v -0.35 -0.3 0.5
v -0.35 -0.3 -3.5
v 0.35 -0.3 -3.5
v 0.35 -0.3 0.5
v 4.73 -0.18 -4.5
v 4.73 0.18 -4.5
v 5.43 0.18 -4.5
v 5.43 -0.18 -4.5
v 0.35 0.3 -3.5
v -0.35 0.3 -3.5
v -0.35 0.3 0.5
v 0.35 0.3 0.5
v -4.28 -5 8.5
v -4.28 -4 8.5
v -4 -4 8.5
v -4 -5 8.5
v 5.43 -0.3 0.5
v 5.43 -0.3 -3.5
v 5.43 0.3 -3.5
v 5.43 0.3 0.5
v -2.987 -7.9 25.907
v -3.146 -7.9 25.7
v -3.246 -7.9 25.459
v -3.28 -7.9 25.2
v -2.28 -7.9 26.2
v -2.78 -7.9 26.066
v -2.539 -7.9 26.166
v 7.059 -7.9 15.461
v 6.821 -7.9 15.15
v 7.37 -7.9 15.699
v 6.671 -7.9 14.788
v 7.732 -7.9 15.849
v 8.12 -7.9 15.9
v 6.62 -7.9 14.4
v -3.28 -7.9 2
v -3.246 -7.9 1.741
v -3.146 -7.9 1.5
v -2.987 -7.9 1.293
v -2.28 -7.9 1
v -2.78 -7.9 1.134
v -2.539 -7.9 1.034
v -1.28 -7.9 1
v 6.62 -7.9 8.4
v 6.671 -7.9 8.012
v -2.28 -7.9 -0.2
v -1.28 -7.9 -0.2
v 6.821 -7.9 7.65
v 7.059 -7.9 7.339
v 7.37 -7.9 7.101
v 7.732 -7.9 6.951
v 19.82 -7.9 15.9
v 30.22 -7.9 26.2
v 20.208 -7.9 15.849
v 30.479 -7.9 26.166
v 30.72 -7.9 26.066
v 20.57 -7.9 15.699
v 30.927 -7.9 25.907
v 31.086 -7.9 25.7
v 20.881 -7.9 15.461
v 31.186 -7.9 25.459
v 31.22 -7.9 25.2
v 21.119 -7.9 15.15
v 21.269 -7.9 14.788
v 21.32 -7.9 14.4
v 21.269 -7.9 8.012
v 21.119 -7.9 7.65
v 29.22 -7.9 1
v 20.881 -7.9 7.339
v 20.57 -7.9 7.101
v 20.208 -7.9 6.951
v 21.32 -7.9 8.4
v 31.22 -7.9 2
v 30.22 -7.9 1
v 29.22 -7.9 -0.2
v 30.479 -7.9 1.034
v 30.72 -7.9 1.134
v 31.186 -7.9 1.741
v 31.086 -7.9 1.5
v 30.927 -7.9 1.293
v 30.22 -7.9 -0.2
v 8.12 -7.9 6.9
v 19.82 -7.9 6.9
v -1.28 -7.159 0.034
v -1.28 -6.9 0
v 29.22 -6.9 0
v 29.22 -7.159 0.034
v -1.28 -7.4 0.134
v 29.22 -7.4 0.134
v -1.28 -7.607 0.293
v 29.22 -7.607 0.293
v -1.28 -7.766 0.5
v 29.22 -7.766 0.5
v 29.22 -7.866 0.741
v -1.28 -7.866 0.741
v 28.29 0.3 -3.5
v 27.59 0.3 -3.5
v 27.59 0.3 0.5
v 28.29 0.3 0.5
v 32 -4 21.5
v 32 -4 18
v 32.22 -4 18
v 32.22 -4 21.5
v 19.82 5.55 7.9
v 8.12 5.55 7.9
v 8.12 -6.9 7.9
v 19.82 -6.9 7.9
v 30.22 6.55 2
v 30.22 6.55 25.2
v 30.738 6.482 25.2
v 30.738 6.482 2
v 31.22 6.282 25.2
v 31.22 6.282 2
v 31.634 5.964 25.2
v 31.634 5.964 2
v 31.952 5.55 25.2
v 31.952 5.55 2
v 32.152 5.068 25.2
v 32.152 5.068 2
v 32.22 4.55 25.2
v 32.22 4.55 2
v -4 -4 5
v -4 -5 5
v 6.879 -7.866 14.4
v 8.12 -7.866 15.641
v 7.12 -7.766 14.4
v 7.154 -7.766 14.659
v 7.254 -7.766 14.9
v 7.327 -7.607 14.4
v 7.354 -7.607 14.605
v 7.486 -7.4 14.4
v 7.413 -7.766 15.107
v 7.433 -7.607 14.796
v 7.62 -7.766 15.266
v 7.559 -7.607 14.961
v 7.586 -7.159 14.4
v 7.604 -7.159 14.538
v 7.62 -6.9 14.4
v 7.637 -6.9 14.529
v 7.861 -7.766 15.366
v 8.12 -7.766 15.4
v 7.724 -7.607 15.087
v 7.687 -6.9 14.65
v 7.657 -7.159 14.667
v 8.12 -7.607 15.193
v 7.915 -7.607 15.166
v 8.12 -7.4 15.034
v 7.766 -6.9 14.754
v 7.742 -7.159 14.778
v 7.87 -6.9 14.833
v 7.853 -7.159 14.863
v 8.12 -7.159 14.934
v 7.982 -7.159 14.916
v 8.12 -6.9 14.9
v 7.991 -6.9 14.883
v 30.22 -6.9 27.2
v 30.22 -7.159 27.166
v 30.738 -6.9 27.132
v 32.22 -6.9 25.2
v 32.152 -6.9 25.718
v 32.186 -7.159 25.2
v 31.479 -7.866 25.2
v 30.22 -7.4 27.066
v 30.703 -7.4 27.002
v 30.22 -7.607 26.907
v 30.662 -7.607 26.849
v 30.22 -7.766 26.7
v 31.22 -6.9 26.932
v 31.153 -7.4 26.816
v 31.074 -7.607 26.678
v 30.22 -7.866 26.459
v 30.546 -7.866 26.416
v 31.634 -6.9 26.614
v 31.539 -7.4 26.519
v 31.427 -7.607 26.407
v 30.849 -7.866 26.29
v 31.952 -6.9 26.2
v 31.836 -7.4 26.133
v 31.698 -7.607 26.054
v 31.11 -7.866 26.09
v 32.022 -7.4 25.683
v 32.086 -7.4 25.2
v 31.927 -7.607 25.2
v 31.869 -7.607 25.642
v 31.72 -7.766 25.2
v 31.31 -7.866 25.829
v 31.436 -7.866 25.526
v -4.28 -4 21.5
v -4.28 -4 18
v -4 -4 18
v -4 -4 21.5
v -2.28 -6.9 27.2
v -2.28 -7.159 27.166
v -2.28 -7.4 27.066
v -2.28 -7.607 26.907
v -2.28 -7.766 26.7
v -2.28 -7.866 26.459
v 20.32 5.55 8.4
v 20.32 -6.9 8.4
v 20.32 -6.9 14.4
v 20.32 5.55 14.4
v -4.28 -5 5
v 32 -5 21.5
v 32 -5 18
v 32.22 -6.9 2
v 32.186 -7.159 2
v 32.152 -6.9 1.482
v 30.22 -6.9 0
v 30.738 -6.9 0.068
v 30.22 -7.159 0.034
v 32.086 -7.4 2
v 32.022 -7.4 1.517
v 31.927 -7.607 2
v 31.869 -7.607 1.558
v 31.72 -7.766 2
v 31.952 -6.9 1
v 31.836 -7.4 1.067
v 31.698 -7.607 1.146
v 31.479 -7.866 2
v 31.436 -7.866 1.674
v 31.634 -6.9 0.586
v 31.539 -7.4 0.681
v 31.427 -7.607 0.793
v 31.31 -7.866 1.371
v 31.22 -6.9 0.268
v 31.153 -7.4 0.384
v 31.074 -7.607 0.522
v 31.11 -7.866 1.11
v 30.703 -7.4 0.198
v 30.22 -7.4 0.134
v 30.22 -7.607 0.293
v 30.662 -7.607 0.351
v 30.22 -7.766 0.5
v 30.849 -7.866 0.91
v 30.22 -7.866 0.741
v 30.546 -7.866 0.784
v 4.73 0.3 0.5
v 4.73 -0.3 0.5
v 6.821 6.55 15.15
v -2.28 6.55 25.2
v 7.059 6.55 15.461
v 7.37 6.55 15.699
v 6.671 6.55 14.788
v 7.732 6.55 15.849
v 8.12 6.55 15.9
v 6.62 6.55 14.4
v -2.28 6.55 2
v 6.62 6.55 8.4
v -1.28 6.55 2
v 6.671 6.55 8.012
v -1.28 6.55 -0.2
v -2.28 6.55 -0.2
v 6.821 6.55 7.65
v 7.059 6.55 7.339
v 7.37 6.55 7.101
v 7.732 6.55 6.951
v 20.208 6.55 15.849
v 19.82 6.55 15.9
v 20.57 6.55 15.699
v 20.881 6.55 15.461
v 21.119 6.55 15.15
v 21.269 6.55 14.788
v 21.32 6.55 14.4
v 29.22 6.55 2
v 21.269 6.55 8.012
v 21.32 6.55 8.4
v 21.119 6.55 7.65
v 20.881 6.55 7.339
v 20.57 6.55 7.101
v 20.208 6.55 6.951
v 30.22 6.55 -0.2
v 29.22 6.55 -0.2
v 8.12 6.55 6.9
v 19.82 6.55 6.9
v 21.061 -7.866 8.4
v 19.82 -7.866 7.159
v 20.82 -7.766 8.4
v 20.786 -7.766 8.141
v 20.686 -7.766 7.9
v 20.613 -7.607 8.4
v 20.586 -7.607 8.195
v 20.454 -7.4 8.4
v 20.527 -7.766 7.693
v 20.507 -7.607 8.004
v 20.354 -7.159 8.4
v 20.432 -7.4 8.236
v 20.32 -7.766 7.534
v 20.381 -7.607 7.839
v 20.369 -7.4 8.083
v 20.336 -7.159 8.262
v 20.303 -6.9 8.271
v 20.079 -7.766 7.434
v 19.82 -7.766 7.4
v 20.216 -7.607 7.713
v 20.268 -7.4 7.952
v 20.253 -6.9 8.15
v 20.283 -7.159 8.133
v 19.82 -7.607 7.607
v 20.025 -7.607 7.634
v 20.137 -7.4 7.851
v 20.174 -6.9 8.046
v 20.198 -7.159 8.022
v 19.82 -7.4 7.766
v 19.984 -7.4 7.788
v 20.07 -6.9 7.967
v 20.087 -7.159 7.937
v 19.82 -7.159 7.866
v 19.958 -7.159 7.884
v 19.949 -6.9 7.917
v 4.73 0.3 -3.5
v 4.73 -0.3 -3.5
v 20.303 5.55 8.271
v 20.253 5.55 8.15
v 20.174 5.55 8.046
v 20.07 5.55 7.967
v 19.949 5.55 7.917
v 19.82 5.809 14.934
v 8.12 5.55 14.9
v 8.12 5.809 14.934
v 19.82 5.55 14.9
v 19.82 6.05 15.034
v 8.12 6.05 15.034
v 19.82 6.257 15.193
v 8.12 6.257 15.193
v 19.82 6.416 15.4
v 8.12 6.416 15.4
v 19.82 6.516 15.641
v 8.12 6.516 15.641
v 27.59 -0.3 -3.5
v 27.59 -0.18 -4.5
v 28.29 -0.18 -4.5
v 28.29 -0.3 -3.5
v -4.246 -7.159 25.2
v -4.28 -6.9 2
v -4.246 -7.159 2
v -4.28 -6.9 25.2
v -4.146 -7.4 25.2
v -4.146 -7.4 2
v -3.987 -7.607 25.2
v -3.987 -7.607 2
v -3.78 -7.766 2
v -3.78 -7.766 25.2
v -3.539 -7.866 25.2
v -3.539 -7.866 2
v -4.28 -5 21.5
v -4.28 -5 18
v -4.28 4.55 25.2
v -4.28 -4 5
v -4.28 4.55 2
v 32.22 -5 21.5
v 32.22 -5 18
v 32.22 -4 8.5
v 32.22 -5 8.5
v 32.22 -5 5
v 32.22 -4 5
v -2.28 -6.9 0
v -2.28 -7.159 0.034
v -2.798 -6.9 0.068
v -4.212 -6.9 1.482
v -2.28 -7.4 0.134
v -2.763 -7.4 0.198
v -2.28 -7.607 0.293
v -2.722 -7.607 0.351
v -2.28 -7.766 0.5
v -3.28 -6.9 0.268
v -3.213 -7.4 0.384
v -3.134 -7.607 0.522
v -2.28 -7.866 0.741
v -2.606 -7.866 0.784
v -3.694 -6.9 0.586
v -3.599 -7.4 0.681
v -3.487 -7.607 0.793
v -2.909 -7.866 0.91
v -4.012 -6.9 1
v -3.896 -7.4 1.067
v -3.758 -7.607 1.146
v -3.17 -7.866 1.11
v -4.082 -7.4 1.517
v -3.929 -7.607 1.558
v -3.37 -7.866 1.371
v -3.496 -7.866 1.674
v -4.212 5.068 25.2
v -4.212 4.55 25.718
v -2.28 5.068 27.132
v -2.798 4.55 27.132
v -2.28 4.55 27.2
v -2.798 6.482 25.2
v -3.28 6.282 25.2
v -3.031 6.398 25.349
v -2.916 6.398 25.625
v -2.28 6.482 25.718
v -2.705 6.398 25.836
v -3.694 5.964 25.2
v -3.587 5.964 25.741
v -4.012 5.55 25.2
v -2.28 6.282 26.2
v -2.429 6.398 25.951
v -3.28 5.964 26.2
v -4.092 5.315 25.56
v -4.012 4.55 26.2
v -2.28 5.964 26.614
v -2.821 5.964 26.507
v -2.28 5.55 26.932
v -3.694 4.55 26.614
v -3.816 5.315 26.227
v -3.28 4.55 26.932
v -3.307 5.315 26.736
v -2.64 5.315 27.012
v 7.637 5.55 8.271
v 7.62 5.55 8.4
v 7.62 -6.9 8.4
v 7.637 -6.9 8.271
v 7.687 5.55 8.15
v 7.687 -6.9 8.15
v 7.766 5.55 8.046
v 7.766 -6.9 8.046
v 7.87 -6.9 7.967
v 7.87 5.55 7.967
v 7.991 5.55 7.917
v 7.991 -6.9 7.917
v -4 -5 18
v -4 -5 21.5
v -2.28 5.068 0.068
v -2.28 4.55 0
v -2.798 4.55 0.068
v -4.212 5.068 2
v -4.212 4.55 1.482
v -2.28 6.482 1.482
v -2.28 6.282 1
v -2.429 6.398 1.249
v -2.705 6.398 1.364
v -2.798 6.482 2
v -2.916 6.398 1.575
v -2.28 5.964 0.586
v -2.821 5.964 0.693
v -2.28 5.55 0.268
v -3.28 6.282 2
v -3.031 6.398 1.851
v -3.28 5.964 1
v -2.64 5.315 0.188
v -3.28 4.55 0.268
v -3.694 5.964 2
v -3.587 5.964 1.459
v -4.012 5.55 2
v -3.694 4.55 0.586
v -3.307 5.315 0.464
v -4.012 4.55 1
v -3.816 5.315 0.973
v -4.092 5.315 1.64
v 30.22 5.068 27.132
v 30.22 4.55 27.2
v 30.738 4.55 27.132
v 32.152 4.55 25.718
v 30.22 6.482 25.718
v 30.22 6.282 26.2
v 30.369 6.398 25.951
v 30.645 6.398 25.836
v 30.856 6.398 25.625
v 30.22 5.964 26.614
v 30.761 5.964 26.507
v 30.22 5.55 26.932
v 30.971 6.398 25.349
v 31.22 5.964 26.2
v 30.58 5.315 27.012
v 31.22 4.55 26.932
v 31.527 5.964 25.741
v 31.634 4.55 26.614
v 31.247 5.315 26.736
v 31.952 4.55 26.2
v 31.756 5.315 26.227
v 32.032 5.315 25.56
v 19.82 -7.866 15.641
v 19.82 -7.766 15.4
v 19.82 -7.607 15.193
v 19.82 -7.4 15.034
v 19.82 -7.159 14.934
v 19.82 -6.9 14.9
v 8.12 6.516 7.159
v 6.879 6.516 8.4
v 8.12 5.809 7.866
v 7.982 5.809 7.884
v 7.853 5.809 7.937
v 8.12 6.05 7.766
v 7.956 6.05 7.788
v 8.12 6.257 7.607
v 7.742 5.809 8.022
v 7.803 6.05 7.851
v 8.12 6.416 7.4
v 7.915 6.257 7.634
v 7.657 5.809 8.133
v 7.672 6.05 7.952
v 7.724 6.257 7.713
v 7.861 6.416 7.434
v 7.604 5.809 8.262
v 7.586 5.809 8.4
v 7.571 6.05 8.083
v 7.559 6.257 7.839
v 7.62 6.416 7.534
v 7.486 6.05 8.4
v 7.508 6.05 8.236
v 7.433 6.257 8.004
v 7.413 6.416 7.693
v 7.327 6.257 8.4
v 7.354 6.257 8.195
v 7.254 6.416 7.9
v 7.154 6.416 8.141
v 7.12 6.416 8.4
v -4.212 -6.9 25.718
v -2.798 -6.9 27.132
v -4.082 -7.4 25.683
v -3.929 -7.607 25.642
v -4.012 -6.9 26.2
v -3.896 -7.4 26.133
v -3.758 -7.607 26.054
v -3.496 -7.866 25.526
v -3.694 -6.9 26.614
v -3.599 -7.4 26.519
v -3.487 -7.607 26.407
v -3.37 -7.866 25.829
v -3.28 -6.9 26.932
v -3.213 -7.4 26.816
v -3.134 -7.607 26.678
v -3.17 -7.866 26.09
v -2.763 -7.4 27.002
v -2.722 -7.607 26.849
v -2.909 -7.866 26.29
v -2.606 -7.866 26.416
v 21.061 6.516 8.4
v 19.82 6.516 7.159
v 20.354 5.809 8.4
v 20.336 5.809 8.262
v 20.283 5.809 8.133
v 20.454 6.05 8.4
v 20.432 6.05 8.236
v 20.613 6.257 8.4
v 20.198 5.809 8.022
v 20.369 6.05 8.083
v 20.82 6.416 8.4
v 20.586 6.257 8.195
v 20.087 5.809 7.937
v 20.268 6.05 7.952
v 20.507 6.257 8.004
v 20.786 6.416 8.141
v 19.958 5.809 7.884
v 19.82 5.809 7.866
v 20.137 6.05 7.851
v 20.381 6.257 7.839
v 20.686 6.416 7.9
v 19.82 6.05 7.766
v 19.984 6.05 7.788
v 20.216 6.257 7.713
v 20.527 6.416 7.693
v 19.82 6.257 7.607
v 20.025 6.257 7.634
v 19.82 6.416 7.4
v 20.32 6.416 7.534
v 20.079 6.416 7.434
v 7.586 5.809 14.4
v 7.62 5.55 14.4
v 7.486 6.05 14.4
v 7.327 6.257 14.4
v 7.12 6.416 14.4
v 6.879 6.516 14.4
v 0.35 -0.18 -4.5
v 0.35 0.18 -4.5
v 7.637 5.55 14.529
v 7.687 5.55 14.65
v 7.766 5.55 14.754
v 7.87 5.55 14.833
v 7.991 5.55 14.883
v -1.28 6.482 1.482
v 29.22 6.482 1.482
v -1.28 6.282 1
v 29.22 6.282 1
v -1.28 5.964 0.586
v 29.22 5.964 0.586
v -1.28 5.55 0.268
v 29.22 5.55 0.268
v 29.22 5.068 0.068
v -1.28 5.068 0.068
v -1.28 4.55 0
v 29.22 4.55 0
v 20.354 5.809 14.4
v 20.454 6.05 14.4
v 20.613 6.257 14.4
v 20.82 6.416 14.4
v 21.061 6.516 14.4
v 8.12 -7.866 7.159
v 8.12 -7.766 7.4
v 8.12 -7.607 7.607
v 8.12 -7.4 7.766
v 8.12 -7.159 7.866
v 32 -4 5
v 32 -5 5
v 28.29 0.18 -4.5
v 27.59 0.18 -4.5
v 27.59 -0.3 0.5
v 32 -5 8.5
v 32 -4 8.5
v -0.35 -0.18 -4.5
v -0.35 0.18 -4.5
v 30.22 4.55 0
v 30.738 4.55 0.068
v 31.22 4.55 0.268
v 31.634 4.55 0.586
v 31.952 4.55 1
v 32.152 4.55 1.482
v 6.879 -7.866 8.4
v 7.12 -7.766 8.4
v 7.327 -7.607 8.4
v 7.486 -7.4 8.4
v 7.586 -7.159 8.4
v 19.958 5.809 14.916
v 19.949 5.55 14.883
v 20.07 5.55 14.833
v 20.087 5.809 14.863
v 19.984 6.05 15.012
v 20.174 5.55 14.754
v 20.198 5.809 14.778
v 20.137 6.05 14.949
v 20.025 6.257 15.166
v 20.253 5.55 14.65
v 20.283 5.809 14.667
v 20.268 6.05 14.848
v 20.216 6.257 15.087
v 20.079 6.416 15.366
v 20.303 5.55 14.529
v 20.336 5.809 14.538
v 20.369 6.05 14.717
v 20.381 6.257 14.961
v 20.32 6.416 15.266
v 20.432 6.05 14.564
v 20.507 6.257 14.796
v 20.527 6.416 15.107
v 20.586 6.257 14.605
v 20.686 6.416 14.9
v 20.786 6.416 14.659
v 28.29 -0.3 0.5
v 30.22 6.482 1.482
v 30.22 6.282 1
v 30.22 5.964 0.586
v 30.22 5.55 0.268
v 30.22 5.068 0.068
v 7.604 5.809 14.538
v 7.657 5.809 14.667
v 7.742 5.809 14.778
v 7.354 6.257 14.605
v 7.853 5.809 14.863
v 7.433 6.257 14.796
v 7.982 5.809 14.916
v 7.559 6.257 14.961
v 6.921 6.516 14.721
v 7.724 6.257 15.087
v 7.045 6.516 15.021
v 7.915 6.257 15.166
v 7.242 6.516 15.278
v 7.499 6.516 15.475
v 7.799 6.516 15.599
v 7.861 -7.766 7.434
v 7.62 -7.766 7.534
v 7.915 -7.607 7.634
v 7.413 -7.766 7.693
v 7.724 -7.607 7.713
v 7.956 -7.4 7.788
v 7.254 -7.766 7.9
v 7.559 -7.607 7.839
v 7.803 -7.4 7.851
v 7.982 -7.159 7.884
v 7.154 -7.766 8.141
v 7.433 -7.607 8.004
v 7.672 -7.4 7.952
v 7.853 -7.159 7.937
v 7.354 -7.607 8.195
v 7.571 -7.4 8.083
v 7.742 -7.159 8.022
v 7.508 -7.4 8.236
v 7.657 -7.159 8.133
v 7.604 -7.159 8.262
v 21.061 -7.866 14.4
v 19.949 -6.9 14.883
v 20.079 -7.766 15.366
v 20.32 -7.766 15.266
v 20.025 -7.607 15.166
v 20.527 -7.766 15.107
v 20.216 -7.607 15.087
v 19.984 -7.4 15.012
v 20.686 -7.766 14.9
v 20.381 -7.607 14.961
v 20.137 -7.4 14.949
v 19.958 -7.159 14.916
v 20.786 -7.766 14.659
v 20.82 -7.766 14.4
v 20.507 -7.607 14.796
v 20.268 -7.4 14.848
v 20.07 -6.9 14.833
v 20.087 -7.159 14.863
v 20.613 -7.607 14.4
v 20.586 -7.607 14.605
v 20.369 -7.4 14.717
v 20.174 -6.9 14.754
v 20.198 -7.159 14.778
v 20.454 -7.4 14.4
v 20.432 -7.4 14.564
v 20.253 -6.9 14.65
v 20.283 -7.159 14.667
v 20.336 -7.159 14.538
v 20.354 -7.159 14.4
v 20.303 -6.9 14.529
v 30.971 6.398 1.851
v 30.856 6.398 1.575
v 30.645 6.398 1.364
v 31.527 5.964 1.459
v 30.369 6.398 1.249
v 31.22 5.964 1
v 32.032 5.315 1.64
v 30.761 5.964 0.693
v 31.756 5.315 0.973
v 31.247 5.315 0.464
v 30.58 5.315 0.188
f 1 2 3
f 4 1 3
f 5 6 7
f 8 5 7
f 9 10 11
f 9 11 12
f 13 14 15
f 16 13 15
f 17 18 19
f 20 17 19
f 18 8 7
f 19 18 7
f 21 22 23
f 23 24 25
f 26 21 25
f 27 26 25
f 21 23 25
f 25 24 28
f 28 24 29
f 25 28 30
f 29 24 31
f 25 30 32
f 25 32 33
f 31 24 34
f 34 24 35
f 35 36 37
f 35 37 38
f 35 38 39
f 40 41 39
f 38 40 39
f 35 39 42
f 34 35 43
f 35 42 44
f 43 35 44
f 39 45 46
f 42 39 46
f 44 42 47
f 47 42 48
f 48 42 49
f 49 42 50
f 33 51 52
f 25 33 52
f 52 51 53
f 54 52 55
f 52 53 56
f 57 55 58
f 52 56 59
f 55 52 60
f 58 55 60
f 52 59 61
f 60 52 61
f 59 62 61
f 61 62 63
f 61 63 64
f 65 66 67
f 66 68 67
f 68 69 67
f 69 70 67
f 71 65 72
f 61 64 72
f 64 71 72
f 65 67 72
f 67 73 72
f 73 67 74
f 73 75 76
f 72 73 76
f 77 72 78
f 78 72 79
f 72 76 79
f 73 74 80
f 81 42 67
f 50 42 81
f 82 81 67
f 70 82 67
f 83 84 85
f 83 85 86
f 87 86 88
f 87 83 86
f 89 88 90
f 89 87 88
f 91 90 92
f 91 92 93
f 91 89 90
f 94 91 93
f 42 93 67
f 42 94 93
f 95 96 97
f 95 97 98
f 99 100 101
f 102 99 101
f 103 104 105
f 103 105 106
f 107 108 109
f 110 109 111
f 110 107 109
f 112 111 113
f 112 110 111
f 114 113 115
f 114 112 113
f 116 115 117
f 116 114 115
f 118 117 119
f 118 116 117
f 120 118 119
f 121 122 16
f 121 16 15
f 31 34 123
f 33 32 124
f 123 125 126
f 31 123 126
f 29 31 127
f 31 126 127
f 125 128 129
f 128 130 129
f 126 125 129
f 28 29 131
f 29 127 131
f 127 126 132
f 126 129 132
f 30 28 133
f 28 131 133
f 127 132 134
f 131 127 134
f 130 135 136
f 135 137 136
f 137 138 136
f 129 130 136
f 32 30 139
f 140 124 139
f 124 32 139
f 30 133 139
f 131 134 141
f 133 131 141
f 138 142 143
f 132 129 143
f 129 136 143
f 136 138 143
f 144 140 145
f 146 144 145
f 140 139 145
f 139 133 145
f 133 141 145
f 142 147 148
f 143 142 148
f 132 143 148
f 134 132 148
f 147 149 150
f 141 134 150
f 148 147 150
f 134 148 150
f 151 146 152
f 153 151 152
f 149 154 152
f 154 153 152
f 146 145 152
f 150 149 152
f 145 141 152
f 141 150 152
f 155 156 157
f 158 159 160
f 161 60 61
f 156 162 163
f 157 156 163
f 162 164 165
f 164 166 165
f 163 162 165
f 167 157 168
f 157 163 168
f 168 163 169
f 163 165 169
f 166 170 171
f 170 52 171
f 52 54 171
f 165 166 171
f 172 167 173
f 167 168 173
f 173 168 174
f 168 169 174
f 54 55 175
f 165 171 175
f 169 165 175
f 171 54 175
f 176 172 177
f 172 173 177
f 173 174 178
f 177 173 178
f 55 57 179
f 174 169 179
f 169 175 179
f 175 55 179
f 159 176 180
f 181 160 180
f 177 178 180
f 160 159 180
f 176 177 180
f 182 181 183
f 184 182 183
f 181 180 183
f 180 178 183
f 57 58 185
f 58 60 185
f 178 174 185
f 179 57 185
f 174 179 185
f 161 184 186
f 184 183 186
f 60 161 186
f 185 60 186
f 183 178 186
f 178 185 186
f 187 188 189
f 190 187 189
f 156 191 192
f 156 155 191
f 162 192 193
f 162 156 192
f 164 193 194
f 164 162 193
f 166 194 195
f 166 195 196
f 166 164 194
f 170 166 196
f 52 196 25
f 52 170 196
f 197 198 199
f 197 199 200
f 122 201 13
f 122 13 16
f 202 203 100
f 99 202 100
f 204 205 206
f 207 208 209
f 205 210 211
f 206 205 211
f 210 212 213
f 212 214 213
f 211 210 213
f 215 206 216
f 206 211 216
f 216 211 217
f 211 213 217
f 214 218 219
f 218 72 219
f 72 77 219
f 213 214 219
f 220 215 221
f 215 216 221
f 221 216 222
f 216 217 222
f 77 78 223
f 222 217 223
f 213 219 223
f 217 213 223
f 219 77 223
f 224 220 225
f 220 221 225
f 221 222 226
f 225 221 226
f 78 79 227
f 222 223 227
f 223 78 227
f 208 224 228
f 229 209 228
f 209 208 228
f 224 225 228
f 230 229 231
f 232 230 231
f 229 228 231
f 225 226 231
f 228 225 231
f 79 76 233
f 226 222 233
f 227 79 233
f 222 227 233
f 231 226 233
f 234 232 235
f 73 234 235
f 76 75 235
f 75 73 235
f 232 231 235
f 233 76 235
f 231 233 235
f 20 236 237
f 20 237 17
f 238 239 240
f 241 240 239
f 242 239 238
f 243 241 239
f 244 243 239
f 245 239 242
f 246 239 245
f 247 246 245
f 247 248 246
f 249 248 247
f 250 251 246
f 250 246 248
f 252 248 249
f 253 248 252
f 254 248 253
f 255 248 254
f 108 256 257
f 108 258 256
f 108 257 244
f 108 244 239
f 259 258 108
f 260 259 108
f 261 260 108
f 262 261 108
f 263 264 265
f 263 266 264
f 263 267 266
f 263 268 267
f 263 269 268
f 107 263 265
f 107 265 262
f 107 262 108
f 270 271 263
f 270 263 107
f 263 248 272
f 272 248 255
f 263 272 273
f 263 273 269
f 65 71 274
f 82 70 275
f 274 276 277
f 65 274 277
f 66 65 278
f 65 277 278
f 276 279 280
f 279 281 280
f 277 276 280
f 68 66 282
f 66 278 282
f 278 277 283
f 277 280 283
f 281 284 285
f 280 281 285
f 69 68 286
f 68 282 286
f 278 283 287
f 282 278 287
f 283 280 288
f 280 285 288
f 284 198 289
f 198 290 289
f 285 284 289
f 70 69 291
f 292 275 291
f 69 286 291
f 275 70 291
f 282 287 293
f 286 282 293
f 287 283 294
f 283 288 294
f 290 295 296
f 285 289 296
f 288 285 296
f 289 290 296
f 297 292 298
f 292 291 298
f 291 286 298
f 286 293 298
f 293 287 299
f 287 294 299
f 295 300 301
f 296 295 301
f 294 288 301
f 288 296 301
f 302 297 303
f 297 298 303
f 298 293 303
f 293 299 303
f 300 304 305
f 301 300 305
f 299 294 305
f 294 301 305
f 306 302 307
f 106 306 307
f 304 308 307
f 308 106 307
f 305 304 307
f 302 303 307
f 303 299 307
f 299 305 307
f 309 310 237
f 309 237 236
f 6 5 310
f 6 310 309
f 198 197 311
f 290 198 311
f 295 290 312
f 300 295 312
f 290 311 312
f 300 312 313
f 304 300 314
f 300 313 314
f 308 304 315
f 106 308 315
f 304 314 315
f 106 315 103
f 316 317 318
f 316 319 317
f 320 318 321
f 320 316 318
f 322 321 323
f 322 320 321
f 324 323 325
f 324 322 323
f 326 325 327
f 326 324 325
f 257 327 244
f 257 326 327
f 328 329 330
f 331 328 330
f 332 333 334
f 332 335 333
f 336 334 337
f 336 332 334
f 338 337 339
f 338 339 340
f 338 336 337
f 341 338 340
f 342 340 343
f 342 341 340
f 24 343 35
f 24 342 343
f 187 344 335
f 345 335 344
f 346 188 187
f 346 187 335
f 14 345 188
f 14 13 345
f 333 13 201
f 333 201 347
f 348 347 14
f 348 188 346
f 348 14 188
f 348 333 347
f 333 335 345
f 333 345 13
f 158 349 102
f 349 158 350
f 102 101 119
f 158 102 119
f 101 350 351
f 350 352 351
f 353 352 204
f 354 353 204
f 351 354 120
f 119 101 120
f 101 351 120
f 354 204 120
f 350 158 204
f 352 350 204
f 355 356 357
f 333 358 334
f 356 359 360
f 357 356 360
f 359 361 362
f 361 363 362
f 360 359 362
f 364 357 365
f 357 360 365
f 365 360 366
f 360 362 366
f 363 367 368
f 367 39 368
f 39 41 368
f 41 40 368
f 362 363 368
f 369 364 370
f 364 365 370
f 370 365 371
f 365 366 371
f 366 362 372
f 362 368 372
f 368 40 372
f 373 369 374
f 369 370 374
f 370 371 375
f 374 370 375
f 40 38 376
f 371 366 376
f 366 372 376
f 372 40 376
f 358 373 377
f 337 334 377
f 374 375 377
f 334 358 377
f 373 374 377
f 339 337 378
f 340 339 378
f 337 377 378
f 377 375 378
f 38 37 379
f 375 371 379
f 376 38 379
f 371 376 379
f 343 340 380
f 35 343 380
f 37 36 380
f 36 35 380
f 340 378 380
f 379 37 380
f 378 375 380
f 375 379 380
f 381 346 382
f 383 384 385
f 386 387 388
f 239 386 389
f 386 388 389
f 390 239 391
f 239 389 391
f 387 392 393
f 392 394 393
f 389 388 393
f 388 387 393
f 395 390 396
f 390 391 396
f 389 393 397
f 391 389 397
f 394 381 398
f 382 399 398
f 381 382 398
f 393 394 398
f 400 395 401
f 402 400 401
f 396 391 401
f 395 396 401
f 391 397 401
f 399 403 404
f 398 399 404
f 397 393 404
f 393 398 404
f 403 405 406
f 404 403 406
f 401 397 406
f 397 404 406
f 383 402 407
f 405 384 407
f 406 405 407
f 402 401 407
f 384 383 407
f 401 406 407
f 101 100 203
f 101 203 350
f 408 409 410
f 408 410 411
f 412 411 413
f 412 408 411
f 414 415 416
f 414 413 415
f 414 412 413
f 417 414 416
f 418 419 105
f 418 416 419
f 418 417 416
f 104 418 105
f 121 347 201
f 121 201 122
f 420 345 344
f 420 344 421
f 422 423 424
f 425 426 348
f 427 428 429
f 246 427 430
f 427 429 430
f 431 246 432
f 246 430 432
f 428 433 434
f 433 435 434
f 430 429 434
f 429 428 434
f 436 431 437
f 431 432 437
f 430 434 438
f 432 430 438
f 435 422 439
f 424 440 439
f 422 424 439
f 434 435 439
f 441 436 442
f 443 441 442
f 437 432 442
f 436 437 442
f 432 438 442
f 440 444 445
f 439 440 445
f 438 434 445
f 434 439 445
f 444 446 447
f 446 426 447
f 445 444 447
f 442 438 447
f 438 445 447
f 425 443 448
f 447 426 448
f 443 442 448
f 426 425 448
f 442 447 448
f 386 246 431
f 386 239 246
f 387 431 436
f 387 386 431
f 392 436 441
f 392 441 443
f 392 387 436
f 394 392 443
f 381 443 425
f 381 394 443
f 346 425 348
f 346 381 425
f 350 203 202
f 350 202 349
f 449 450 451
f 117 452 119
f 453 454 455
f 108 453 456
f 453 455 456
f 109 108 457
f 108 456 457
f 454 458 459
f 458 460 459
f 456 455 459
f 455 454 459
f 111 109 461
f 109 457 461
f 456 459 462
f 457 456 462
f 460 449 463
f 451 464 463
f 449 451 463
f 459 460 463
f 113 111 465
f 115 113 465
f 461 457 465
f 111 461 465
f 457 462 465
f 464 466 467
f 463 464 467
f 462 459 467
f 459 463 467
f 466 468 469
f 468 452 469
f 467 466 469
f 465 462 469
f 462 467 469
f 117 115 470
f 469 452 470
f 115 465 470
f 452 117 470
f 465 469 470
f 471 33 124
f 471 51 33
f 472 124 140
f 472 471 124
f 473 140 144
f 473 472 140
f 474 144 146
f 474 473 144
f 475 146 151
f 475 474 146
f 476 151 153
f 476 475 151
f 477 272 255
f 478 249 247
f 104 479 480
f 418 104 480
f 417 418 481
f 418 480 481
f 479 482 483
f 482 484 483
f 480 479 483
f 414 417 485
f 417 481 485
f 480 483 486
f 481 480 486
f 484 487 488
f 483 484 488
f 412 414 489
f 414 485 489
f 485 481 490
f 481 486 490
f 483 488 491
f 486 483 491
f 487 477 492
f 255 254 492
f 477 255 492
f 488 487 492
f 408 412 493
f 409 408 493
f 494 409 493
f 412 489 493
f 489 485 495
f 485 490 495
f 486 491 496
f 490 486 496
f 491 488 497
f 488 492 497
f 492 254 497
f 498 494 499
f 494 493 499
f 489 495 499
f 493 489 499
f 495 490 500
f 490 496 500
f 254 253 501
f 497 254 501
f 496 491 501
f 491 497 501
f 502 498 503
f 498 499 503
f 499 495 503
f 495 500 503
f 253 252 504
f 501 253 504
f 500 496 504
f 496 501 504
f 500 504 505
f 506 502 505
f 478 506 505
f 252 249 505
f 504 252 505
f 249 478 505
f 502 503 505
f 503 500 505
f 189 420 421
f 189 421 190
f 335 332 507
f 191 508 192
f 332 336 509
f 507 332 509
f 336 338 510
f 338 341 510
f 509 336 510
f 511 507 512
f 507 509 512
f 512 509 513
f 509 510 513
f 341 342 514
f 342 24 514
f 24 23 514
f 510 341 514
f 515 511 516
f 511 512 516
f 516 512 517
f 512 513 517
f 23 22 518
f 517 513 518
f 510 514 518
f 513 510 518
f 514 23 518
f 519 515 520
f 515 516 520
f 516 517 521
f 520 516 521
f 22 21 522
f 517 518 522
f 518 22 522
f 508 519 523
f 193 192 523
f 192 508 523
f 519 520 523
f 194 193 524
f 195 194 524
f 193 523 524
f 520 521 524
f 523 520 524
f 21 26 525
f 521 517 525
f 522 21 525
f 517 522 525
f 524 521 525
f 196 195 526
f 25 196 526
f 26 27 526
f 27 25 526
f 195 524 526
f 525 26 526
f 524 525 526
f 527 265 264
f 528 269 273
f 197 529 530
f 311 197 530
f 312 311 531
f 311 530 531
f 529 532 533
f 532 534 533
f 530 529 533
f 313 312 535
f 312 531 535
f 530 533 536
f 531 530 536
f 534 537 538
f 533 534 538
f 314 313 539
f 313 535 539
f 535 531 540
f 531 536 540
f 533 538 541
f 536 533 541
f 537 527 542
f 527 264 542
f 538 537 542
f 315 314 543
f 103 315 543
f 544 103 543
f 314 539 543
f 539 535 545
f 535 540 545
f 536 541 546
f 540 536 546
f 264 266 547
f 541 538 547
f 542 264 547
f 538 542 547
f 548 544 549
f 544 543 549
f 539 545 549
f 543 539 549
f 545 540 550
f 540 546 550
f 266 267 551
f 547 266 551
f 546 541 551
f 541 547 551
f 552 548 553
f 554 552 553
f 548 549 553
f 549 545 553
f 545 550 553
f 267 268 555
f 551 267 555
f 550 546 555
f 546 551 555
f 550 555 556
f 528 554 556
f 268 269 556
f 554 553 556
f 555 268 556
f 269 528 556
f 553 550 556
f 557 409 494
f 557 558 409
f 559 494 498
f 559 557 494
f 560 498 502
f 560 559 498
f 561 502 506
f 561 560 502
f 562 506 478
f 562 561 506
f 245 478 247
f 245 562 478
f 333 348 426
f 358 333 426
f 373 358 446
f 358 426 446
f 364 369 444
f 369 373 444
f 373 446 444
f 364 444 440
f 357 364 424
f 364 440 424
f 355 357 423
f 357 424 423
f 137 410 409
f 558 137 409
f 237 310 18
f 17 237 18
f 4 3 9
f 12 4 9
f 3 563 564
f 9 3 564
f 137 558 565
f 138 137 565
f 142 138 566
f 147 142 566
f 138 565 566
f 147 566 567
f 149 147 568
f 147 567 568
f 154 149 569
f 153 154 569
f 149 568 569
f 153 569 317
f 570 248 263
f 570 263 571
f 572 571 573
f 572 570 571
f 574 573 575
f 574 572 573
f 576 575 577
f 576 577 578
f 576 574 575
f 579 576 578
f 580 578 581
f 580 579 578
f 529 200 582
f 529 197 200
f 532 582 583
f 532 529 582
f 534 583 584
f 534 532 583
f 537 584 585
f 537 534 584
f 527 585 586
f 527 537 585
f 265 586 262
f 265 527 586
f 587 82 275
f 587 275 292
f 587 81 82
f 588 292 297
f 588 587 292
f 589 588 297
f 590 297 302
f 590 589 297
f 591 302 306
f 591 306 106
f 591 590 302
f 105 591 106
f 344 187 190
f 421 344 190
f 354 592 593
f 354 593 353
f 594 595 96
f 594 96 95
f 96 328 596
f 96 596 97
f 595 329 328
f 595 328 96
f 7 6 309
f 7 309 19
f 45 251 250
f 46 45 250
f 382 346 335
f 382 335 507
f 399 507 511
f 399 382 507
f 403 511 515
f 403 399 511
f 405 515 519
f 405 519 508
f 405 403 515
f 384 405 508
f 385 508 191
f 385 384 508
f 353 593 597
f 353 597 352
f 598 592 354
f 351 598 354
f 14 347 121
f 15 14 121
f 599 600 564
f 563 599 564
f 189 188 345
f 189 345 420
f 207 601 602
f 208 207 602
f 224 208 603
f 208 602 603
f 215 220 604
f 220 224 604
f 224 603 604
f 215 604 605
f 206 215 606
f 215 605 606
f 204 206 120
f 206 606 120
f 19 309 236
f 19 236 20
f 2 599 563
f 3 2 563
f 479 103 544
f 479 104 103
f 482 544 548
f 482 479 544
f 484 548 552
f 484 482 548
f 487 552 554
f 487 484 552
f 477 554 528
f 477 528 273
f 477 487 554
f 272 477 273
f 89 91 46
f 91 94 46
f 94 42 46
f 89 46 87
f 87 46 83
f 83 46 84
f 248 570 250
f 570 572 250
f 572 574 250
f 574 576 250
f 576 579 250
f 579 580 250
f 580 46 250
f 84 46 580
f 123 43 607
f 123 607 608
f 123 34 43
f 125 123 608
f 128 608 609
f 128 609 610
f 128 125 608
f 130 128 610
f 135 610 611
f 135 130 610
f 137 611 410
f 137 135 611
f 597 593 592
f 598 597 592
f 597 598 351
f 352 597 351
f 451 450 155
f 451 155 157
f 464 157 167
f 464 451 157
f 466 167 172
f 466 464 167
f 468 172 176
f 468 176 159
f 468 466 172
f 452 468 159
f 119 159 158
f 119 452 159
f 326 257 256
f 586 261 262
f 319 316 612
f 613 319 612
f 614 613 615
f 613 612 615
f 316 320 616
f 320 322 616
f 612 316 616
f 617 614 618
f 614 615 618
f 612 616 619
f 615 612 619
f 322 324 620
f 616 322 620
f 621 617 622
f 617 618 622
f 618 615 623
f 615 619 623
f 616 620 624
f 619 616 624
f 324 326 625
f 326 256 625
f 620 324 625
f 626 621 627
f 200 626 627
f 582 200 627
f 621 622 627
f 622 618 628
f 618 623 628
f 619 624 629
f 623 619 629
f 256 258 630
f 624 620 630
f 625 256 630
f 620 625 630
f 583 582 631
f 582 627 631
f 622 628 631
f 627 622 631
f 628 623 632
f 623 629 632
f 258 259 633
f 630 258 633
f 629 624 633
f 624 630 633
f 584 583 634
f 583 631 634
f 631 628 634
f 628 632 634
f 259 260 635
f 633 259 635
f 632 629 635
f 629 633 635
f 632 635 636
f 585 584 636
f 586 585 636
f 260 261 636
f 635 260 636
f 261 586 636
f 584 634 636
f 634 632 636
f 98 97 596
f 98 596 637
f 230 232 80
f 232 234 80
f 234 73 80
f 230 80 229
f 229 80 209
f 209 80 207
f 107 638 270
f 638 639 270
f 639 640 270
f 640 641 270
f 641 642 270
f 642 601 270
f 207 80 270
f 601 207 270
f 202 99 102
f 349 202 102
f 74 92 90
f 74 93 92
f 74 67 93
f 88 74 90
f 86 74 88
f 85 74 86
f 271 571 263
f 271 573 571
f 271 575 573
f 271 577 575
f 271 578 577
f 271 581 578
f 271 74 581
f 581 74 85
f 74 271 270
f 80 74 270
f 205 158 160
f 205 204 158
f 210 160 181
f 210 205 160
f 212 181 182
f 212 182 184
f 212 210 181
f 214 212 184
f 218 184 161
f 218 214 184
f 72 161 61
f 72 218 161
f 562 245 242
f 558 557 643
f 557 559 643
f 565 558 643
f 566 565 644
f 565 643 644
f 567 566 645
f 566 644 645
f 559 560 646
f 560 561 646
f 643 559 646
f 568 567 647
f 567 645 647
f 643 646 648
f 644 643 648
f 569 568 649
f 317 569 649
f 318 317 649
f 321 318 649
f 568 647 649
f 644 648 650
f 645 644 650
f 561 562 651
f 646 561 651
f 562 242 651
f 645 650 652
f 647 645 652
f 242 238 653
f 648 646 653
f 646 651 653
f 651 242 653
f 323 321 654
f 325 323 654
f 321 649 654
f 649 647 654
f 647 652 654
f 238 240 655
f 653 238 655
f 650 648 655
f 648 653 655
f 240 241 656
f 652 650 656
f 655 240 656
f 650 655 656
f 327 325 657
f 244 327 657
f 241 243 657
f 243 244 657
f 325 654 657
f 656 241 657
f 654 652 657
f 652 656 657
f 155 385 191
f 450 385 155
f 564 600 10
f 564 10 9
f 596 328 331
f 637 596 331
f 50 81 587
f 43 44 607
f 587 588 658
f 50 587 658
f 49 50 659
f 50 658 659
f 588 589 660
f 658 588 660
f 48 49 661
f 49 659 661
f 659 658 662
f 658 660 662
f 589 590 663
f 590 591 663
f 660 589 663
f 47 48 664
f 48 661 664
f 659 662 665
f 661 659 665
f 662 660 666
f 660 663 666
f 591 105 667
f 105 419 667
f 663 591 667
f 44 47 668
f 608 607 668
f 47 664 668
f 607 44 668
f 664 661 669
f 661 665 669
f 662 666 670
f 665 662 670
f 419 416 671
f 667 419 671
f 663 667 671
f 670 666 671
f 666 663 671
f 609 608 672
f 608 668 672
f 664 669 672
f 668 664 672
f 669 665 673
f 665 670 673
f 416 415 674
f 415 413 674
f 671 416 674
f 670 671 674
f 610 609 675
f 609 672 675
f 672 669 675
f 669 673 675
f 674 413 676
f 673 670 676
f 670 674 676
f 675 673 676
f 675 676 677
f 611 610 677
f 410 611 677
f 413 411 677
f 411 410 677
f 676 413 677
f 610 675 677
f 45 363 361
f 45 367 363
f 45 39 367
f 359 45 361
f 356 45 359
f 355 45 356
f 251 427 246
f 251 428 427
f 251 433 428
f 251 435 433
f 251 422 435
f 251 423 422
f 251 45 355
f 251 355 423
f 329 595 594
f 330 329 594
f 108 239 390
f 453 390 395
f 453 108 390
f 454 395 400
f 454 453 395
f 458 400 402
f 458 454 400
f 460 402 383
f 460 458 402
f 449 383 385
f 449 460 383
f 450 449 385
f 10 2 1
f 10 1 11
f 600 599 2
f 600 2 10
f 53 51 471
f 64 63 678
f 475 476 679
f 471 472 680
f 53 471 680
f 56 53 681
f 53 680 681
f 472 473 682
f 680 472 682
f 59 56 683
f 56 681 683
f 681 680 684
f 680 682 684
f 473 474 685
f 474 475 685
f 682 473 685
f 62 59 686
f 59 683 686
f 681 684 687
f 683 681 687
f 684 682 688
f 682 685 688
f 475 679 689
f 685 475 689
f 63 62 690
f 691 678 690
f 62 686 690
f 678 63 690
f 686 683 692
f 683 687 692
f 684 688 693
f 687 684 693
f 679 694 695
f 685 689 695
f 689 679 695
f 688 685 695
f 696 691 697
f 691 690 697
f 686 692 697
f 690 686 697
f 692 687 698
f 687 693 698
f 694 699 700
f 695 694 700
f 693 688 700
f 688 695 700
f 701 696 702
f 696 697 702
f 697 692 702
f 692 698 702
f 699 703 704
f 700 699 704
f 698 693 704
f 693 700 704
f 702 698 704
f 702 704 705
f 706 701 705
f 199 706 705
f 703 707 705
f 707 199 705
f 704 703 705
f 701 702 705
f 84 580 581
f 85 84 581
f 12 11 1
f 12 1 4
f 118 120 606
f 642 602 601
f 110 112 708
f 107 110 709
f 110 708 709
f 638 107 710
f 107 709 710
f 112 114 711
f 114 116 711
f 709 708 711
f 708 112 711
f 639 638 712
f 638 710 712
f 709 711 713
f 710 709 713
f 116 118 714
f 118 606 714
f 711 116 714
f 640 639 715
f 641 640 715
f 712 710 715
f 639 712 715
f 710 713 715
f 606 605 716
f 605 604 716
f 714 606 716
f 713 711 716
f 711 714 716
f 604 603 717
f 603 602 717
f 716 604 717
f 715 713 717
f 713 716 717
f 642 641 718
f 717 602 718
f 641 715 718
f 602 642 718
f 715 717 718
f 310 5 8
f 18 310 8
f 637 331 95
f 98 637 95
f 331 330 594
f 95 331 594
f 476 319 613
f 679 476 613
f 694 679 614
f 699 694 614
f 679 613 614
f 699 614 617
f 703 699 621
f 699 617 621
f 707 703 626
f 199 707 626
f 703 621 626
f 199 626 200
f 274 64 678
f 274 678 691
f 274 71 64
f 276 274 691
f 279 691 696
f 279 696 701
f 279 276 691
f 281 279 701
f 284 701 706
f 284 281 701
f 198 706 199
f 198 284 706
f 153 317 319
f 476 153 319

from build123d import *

# Parameters (mm, degrees)
BOX002_W           = 0.7
BOX002_H           = 0.6
BOX002_DEPTH       = 5
CHAMFER_1_SIZE2    = 0.12
CHAMFER_1_SIZE     = 1
CHAMFER_2_SIZE2    = 0.12
CHAMFER_2_SIZE     = 1
BOX001_W           = 0.7
BOX001_H           = 0.6
BOX001_DEPTH       = 5
CHAMFER001_1_SIZE2 = 0.12
CHAMFER001_1_SIZE  = 1
CHAMFER001_2_SIZE2 = 0.12
CHAMFER001_2_SIZE  = 1
BOX_W              = 0.7
BOX_H              = 0.6
BOX_DEPTH          = 5
CHAMFER002_1_SIZE2 = 0.12
CHAMFER002_1_SIZE  = 1
CHAMFER002_2_SIZE2 = 0.12
CHAMFER002_2_SIZE  = 1
BOX009_W           = 1
BOX009_H           = 1
BOX009_DEPTH       = 3.5
BOX008_W           = 1
BOX008_H           = 1
BOX008_DEPTH       = 3.5
BOX007_W           = 1
BOX007_H           = 1
BOX007_DEPTH       = 3.5
BOX006_W           = 1
BOX006_H           = 1
BOX006_DEPTH       = 3.5
BOX004_W           = 1
BOX004_H           = 14.45
BOX004_DEPTH       = 2.2
BOX005_W           = 1
BOX005_H           = 14.45
BOX005_DEPTH       = 2.2
BOX003_W           = 12.7
BOX003_H           = 29
BOX003_DEPTH       = 7
SKETCH_W           = 36.5
SKETCH_H           = 14.45
PAD_DEPTH          = 27.2
FILLET_R           = 0.5
FILLET001_R        = 1
FILLET002_R        = 1
FILLET003_R        = 2
FILLET004_R        = 2
FILLET005_R        = 1


with BuildPart() as chamfer_body:
    # Box002 → Box002 (new body)
    with BuildSketch(Plane(origin=(27.59, -0.3, -4.5), x_dir=(1, 0, 0), z_dir=(0, 0, 1))):
        with Locations((0.35, 0.3)):
            Rectangle(BOX002_W, BOX002_H)
    extrude(amount=BOX002_DEPTH)

    # Chamfer 1
    chamfer_1_edges = [chamfer_body.edges().sort_by_distance(p)[0] for p in [
        (27.94, 0.3, -4.5),
    ]]
    chamfer_1_side = chamfer_body.faces().sort_by_distance((27.94, 0.3, -2))[0]
    chamfer(chamfer_1_edges, length=CHAMFER_1_SIZE, length2=CHAMFER_1_SIZE2, reference=chamfer_1_side)

    # Chamfer 2
    chamfer_2_edges = [chamfer_body.edges().sort_by_distance(p)[0] for p in [
        (27.94, -0.3, -4.5),
    ]]
    chamfer_2_side = chamfer_body.faces().sort_by_distance((27.94, -0.3, -2))[0]
    chamfer(chamfer_2_edges, length=CHAMFER_2_SIZE, length2=CHAMFER_2_SIZE2, reference=chamfer_2_side)


with BuildPart() as chamfer001:
    # Box001 → Box001 (new body)
    with BuildSketch(Plane(origin=(4.73, -0.3, -4.5), x_dir=(1, 0, 0), z_dir=(0, 0, 1))):
        with Locations((0.35, 0.3)):
            Rectangle(BOX001_W, BOX001_H)
    extrude(amount=BOX001_DEPTH)

    # Chamfer001 1
    chamfer001_1_edges = [chamfer001.edges().sort_by_distance(p)[0] for p in [
        (5.08, 0.3, -4.5),
    ]]
    chamfer001_1_side = chamfer001.faces().sort_by_distance((5.08, 0.3, -2))[0]
    chamfer(chamfer001_1_edges, length=CHAMFER001_1_SIZE, length2=CHAMFER001_1_SIZE2, reference=chamfer001_1_side)

    # Chamfer001 2
    chamfer001_2_edges = [chamfer001.edges().sort_by_distance(p)[0] for p in [
        (5.08, -0.3, -4.5),
    ]]
    chamfer001_2_side = chamfer001.faces().sort_by_distance((5.08, -0.3, -2))[0]
    chamfer(chamfer001_2_edges, length=CHAMFER001_2_SIZE, length2=CHAMFER001_2_SIZE2, reference=chamfer001_2_side)


with BuildPart() as chamfer002:
    # Box → Box (new body)
    with BuildSketch(Plane(origin=(-0.35, -0.3, -4.5), x_dir=(1, 0, 0), z_dir=(0, 0, 1))):
        with Locations((0.35, 0.3)):
            Rectangle(BOX_W, BOX_H)
    extrude(amount=BOX_DEPTH)

    # Chamfer002 1
    chamfer002_1_edges = [chamfer002.edges().sort_by_distance(p)[0] for p in [
        (0, 0.3, -4.5),
    ]]
    chamfer002_1_side = chamfer002.faces().sort_by_distance((0, 0.3, -2))[0]
    chamfer(chamfer002_1_edges, length=CHAMFER002_1_SIZE, length2=CHAMFER002_1_SIZE2, reference=chamfer002_1_side)

    # Chamfer002 2
    chamfer002_2_edges = [chamfer002.edges().sort_by_distance(p)[0] for p in [
        (0, -0.3, -4.5),
    ]]
    chamfer002_2_side = chamfer002.faces().sort_by_distance((0, -0.3, -2))[0]
    chamfer(chamfer002_2_edges, length=CHAMFER002_2_SIZE, length2=CHAMFER002_2_SIZE2, reference=chamfer002_2_side)


with BuildPart() as kub009:
    # Box009 → Box009 (new body)
    with BuildSketch(Plane(origin=(-5, -5, 18), x_dir=(1, 0, 0), z_dir=(0, 0, 1))):
        with Locations((0.5, 0.5)):
            Rectangle(BOX009_W, BOX009_H)
    extrude(amount=BOX009_DEPTH)


with BuildPart() as kub008:
    # Box008 → Box008 (new body)
    with BuildSketch(Plane(origin=(-5, -5, 5), x_dir=(1, 0, 0), z_dir=(0, 0, 1))):
        with Locations((0.5, 0.5)):
            Rectangle(BOX008_W, BOX008_H)
    extrude(amount=BOX008_DEPTH)


with BuildPart() as kub007:
    # Box007 → Box007 (new body)
    with BuildSketch(Plane(origin=(32, -5, 18), x_dir=(1, 0, 0), z_dir=(0, 0, 1))):
        with Locations((0.5, 0.5)):
            Rectangle(BOX007_W, BOX007_H)
    extrude(amount=BOX007_DEPTH)


with BuildPart() as kub006:
    # Box006 → Box006 (new body)
    with BuildSketch(Plane(origin=(32, -5, 5), x_dir=(1, 0, 0), z_dir=(0, 0, 1))):
        with Locations((0.5, 0.5)):
            Rectangle(BOX006_W, BOX006_H)
    extrude(amount=BOX006_DEPTH)


with BuildPart() as kub004:
    # Box004 → Box004 (new body)
    with BuildSketch(Plane(origin=(-2.28, -7.9, -0.2), x_dir=(1, 0, 0), z_dir=(0, 0, 1))):
        with Locations((0.5, 7.225)):
            Rectangle(BOX004_W, BOX004_H)
    extrude(amount=BOX004_DEPTH)


with BuildPart() as kub005:
    # Box005 → Box005 (new body)
    with BuildSketch(Plane(origin=(29.22, -7.9, -0.2), x_dir=(1, 0, 0), z_dir=(0, 0, 1))):
        with Locations((0.5, 7.225)):
            Rectangle(BOX005_W, BOX005_H)
    extrude(amount=BOX005_DEPTH)


with BuildPart() as kub003:
    # Box003 → Box003 (new body)
    with BuildSketch(Plane(origin=(7.62, -14, 7.9), x_dir=(1, 0, 0), z_dir=(0, 0, 1))):
        with Locations((6.35, 14.5)):
            Rectangle(BOX003_W, BOX003_H)
    extrude(amount=BOX003_DEPTH)


with BuildPart() as cut004:
    # Sketch → Pad (new body)
    with BuildSketch(Plane.XY):
        with Locations((13.97, -0.675)):
            Rectangle(SKETCH_W, SKETCH_H)
    extrude(amount=PAD_DEPTH)

    # Cut: cut Kub003
    add(kub003.part, mode=Mode.SUBTRACT)

    # Fillet
    fillet_edges = [cut004.edges().sort_by_distance(p)[0] for p in [
        (7.62, -0.675, 14.9),
        (20.32, -0.675, 14.9),
        (20.32, -0.675, 7.9),
        (7.62, -0.675, 7.9),
    ]]
    fillet(fillet_edges, radius=FILLET_R)

    # Fillet001
    fillet001_edges = [cut004.edges().sort_by_distance(p)[0] for p in [
        (13.97, -7.9, 14.9),
        (7.766447, -7.9, 14.753553),
        (20.173553, -7.9, 14.753553),
        (7.62, -7.9, 11.4),
        (20.32, -7.9, 11.4),
        (7.766447, -7.9, 8.046447),
        (20.173553, -7.9, 8.046447),
        (13.97, -7.9, 7.9),
    ]]
    fillet(fillet001_edges, radius=FILLET001_R)

    # Fillet002
    fillet002_edges = [cut004.edges().sort_by_distance(p)[0] for p in [
        (13.97, 6.55, 14.9),
        (20.173553, 6.55, 14.753553),
        (7.62, 6.55, 11.4),
        (20.32, 6.55, 11.4),
        (7.766447, 6.55, 8.046447),
        (20.173553, 6.55, 8.046447),
        (13.97, 6.55, 7.9),
    ]]
    fillet(fillet002_edges, radius=FILLET002_R)

    # Fillet003
    fillet003_edges = [cut004.edges().sort_by_distance(p)[0] for p in [
        (-4.28, -0.675, 0),
        (-4.28, -0.675, 27.2),
        (32.22, -0.675, 0),
        (32.22, -0.675, 27.2),
    ]]
    fillet(fillet003_edges, radius=FILLET003_R)

    # Fillet004
    fillet004_edges = [cut004.edges().sort_by_distance(p)[0] for p in [
        (-4.28, 6.55, 13.6),
        (-3.694214, 6.55, 0.585786),
        (-3.694214, 6.55, 26.614214),
        (13.97, 6.55, 0),
        (13.97, 6.55, 27.2),
        (31.634214, 6.55, 0.585786),
        (31.634214, 6.55, 26.614214),
        (32.22, 6.55, 13.6),
    ]]
    fillet(fillet004_edges, radius=FILLET004_R)

    # Fillet005
    fillet005_edges = [cut004.edges().sort_by_distance(p)[0] for p in [
        (-4.28, -7.9, 13.6),
        (13.97, -7.9, 0),
        (13.97, -7.9, 27.2),
        (32.22, -7.9, 13.6),
        (-3.694214, -7.9, 0.585786),
        (31.634214, -7.9, 0.585786),
        (31.634214, -7.9, 26.614214),
        (-3.694214, -7.9, 26.614214),
    ]]
    fillet(fillet005_edges, radius=FILLET005_R)

    # Fusion: union Kub004, Kub005
    add(kub004.part)
    add(kub005.part)

    # Cut001: cut Kub006
    add(kub006.part, mode=Mode.SUBTRACT)

    # Cut002: cut Kub007
    add(kub007.part, mode=Mode.SUBTRACT)

    # Cut003: cut Kub008
    add(kub008.part, mode=Mode.SUBTRACT)

    # Cut004: cut Kub009
    add(kub009.part, mode=Mode.SUBTRACT)


solid = Compound([chamfer_body.part, chamfer001.part, chamfer002.part, cut004.part])
